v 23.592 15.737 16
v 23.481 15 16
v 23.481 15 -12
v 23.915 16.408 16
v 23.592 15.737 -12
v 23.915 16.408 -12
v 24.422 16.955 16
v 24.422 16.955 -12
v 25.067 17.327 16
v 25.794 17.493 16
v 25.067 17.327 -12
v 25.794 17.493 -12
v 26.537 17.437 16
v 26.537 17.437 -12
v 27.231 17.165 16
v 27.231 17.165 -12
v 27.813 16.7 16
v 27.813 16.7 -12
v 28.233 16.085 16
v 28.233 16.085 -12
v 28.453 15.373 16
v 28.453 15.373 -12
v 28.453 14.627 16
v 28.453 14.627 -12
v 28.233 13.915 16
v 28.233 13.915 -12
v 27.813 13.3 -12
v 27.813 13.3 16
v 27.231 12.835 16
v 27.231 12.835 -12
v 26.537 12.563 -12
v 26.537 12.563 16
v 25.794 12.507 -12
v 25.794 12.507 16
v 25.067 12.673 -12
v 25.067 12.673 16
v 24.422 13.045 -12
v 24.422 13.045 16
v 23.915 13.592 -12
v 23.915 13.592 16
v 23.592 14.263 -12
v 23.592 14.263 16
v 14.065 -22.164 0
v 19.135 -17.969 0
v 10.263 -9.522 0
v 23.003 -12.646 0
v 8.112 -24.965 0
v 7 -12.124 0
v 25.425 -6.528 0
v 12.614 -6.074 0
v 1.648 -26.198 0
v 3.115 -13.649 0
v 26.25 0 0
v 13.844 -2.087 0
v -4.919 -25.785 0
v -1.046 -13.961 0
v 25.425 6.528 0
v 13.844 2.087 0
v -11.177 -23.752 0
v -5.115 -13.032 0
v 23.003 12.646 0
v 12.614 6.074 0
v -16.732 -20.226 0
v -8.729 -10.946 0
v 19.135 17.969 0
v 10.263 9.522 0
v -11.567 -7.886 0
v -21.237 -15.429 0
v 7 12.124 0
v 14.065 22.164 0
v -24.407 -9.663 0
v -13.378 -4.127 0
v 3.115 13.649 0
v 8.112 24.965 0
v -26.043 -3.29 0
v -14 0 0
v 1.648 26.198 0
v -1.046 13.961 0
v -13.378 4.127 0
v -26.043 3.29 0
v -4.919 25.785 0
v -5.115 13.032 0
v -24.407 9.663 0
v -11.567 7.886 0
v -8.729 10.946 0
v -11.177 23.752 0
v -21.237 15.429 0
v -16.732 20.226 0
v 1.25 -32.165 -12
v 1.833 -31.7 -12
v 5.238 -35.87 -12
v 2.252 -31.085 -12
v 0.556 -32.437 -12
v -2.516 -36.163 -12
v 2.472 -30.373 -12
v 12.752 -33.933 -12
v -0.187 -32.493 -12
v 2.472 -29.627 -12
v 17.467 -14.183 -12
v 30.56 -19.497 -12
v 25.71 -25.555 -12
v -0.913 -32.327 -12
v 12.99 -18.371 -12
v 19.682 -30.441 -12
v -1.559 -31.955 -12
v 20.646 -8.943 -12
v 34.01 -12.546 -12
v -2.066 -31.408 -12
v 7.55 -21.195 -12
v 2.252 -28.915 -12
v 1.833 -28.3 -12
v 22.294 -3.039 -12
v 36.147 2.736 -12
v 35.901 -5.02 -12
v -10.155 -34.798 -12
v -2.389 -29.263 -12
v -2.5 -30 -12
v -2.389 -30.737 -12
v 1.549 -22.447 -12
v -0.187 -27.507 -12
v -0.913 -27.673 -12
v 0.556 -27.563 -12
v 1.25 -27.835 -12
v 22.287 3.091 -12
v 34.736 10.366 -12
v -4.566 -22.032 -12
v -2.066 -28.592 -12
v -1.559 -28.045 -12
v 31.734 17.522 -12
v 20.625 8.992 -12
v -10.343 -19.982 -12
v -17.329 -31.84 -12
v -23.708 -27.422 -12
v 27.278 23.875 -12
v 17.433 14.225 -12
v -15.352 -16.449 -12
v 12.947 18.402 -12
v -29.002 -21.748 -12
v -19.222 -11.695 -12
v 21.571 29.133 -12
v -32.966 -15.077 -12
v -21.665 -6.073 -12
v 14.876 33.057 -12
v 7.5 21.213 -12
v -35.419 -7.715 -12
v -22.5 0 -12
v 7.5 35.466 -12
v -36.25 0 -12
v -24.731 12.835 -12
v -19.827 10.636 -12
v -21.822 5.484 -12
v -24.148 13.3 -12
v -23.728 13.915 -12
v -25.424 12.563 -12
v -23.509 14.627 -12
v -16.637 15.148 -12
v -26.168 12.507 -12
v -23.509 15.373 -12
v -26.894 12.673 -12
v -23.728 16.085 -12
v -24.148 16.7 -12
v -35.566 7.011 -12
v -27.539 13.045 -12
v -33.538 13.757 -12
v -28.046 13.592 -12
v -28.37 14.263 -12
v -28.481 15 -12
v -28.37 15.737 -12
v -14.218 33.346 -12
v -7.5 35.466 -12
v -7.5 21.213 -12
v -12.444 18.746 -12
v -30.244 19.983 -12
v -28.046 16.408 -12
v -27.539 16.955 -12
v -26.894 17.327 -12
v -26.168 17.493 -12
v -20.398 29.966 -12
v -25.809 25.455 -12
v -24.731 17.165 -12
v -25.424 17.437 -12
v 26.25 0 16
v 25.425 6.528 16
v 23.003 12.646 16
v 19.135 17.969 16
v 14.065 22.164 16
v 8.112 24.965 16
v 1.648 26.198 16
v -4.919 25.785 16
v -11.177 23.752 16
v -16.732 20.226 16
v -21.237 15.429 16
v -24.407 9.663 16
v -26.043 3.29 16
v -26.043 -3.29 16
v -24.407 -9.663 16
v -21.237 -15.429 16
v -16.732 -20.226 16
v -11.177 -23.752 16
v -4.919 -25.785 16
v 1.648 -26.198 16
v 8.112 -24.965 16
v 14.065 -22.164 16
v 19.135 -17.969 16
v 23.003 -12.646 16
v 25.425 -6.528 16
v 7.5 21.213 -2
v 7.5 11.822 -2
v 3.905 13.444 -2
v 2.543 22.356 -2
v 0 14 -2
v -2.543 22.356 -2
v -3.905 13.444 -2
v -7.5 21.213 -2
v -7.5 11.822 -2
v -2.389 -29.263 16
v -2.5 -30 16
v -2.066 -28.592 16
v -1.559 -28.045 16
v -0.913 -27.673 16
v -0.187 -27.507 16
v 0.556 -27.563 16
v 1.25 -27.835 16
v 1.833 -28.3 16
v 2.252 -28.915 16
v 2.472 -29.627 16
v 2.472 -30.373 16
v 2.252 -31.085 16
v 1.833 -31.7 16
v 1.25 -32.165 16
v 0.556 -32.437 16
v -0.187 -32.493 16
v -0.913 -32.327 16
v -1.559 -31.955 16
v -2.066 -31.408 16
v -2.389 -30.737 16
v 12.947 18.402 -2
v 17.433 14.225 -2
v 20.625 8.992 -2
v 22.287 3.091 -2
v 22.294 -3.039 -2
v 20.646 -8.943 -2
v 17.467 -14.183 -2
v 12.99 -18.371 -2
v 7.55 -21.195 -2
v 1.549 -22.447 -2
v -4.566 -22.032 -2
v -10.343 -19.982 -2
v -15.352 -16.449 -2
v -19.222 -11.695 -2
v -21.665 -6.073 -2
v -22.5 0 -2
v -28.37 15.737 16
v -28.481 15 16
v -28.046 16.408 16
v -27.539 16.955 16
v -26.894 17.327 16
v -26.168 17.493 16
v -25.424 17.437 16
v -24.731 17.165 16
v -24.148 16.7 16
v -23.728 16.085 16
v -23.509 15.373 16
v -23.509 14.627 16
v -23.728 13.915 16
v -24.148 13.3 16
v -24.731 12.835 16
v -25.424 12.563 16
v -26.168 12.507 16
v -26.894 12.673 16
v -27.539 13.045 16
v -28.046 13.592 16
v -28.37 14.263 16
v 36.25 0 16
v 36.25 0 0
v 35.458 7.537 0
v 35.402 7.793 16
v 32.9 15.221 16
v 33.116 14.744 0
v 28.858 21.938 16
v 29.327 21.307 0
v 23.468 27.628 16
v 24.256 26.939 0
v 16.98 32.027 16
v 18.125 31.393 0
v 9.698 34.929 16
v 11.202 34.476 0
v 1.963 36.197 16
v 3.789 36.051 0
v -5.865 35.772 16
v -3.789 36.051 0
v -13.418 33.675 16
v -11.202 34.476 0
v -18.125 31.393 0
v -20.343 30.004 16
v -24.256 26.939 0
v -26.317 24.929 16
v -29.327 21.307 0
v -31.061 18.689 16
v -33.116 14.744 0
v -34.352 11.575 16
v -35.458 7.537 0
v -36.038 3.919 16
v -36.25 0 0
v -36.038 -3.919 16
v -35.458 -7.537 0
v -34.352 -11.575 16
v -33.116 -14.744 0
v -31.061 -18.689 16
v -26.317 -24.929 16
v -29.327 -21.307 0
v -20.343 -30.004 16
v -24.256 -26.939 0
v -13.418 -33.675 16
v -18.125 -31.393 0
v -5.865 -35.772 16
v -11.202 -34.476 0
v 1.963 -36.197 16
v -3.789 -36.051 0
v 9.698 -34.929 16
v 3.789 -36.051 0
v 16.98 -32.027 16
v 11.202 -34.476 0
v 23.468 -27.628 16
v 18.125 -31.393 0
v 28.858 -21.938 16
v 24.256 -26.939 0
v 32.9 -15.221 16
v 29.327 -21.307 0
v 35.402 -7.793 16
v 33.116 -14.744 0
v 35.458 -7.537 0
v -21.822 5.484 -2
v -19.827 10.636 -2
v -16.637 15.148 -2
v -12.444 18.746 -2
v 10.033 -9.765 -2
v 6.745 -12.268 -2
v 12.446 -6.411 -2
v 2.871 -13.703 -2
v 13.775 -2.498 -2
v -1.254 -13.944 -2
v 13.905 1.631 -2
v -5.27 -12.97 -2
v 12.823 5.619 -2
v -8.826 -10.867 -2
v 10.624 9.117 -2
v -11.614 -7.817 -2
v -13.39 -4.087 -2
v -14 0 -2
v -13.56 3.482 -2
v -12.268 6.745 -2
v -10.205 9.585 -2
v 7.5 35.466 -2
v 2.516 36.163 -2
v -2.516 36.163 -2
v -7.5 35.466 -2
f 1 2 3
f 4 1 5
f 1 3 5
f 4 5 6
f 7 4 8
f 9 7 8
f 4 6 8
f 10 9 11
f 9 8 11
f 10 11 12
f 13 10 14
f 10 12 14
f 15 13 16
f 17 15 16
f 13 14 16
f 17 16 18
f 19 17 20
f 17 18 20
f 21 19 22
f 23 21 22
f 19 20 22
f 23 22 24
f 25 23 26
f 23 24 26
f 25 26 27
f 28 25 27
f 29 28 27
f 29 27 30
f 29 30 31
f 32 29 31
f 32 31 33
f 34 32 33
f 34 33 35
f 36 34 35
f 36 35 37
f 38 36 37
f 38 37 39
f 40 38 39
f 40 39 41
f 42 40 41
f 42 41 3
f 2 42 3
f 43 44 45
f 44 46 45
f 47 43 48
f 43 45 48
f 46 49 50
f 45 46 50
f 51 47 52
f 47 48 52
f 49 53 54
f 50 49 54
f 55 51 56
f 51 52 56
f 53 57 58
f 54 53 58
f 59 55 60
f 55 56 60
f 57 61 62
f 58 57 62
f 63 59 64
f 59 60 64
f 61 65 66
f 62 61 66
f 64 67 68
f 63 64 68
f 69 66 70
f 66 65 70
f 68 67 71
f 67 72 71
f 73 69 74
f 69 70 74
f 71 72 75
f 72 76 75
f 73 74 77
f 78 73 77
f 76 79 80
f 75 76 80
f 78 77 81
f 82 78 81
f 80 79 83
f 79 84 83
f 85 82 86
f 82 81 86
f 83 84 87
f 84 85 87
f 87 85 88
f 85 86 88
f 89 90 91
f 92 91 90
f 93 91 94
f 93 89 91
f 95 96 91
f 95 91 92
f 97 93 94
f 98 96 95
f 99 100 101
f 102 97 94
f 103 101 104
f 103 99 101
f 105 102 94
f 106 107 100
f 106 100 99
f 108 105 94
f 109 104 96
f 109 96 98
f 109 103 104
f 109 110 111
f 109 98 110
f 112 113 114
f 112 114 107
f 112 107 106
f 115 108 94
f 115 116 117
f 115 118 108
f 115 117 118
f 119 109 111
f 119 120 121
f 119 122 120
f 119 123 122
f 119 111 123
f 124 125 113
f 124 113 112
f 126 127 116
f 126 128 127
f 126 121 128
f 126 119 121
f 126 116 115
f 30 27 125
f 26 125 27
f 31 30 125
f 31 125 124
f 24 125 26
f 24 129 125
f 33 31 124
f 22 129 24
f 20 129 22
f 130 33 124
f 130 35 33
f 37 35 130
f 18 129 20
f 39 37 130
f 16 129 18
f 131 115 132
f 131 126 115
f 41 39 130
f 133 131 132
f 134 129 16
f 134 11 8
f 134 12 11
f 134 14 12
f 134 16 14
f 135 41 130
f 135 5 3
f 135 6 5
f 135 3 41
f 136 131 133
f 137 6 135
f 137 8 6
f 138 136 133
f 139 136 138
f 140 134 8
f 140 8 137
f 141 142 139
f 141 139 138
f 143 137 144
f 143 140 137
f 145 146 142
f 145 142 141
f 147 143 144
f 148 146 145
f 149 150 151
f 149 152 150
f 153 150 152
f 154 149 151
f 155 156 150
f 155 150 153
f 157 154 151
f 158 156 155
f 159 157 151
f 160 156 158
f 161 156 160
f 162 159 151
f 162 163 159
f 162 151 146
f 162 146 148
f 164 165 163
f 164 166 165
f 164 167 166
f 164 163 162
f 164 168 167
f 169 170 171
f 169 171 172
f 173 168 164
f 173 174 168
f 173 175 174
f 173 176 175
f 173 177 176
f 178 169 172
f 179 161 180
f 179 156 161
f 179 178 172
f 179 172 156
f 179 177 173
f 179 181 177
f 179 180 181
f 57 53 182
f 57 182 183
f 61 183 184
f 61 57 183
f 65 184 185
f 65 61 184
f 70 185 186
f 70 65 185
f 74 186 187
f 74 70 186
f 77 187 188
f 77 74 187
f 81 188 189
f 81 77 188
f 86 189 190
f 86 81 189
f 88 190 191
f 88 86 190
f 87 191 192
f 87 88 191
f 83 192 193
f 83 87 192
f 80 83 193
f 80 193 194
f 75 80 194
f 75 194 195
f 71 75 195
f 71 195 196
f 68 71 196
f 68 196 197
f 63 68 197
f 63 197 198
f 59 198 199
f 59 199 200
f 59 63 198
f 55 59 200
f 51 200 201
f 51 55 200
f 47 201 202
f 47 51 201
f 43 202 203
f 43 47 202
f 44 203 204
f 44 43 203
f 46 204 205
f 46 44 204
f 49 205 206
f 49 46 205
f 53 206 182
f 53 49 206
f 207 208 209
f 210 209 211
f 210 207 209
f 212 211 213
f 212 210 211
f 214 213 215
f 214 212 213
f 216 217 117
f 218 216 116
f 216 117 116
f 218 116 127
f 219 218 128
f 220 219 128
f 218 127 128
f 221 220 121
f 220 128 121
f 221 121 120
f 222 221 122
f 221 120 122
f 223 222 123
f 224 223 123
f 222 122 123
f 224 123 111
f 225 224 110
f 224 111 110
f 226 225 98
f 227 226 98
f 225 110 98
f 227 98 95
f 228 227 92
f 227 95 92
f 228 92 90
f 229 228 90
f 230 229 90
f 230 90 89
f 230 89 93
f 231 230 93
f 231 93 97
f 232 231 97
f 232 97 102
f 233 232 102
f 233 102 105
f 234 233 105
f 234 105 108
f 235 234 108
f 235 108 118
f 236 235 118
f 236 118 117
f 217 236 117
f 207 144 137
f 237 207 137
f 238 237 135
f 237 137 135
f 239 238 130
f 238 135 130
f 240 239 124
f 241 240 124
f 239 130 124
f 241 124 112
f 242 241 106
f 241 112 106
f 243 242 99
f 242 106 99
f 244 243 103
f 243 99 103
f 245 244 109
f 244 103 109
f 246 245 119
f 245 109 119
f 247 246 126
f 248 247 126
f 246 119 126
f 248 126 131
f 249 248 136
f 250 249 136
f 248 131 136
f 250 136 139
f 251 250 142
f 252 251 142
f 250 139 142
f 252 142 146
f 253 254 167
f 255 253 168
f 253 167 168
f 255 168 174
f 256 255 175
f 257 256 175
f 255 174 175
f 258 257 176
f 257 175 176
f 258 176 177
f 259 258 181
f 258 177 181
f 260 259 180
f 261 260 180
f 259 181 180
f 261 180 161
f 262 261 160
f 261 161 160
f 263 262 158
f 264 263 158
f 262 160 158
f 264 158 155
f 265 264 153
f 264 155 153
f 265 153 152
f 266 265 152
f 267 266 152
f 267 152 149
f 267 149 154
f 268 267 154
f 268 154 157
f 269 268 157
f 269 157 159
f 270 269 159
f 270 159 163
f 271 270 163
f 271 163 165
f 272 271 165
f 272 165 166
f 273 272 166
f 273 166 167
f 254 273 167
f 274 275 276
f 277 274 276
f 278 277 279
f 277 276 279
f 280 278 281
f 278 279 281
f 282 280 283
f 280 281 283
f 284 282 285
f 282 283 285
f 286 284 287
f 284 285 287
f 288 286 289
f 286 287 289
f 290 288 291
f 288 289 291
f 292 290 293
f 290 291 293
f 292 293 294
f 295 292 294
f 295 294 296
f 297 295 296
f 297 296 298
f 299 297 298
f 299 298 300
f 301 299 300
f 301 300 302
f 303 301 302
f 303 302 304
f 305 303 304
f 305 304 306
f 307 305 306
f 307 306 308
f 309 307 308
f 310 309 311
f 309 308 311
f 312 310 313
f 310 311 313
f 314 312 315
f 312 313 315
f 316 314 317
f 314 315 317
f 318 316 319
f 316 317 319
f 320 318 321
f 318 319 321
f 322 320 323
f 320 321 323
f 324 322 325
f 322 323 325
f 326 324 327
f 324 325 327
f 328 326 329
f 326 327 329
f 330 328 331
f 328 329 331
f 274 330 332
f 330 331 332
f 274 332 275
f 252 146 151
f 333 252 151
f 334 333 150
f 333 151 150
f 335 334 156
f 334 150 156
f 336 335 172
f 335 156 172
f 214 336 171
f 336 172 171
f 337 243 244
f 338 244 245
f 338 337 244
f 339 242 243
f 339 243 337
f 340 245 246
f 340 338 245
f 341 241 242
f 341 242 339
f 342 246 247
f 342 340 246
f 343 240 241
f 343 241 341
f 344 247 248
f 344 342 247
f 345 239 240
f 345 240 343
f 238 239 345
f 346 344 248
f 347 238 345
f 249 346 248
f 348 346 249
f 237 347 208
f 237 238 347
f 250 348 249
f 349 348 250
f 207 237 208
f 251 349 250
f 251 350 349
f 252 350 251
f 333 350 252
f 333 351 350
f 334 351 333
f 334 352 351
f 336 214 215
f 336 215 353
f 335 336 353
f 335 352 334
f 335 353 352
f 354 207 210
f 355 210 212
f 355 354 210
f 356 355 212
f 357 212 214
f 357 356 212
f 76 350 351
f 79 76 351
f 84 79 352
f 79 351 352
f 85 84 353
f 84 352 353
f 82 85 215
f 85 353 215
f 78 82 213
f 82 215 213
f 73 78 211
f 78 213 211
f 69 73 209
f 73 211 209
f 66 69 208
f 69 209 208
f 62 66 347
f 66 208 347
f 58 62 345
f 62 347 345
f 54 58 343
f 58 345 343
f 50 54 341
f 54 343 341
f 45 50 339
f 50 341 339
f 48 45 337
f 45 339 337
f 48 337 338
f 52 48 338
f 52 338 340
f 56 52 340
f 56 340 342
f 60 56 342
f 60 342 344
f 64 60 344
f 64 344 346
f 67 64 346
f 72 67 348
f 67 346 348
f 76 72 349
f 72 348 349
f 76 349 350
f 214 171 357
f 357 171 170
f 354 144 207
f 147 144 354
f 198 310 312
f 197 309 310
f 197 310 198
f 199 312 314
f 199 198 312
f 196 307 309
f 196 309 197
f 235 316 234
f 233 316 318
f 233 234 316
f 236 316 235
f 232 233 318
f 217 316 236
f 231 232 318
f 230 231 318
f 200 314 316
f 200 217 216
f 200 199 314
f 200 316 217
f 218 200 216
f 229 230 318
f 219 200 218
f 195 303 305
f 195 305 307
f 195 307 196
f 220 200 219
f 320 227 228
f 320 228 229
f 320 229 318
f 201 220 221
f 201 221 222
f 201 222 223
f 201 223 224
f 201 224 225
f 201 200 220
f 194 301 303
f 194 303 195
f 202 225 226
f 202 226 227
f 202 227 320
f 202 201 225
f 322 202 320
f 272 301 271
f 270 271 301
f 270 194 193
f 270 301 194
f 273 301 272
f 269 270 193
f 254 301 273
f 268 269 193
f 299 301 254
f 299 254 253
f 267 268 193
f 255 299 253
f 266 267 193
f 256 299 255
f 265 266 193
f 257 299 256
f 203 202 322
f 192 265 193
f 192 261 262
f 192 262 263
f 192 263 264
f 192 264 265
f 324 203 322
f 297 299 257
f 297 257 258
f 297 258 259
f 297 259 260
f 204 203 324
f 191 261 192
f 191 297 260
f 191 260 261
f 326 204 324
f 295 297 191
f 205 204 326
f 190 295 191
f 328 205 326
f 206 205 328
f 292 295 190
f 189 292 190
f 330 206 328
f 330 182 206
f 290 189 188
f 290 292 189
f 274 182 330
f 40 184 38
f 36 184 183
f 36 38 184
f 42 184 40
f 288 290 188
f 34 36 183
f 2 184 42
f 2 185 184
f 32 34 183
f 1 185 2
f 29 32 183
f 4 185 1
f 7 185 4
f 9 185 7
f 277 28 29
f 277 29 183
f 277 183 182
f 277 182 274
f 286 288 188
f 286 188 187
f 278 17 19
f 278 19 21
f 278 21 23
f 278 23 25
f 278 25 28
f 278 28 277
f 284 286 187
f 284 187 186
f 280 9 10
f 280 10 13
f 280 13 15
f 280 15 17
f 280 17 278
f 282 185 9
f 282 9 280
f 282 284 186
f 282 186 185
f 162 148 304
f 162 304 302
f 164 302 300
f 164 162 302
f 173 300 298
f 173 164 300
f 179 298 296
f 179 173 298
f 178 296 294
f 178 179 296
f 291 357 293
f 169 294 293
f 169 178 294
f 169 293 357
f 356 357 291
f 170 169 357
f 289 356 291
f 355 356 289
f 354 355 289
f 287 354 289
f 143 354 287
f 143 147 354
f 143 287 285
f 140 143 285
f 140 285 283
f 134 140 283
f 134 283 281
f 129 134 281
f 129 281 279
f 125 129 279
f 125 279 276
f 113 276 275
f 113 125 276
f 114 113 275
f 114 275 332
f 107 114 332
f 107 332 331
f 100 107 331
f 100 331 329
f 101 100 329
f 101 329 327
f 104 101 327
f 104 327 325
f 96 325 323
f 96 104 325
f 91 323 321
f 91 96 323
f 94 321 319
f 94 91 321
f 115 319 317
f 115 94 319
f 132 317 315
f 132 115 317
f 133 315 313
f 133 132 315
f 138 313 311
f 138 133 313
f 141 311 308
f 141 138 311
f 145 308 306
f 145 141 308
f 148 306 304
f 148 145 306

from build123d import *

# Parameters (mm, degrees)
SKETCH1_R           = 36.25
SKETCH1_R_2         = 26.25
BOSS_EXTRUDE1_DEPTH = 16
BOSS_EXTRUDE2_START = 12
SKETCH2_R           = 36.25
SKETCH2_R_2         = 14
BOSS_EXTRUDE2_DEPTH = 12
SKETCH4_W           = 15
SKETCH4_H           = 30
CUT_EXTRUDE1_DEPTH  = 10
SKETCH5_R           = 22.5
CUT_EXTRUDE2_DEPTH  = 10
SKETCH7_R           = 2.5
CUT_EXTRUDE3_DEPTH  = 59.413397436


with BuildPart() as part:
    # Sketch1 → Boss-Extrude1 (new body)
    with BuildSketch(Plane.XY):
        Circle(SKETCH1_R)
        Circle(SKETCH1_R_2, mode=Mode.SUBTRACT)
    extrude(amount=BOSS_EXTRUDE1_DEPTH)

    # Sketch2 → Boss-Extrude2 (add)
    with BuildSketch(Plane(origin=(0, 0, 0), x_dir=(-1, 0, 0), z_dir=(0, 0, -1)).offset(BOSS_EXTRUDE2_START)):
        Circle(SKETCH2_R)
        Circle(SKETCH2_R_2, mode=Mode.SUBTRACT)
    extrude(amount=-BOSS_EXTRUDE2_DEPTH)

    # Sketch4 → Cut-Extrude1 (cut)
    with BuildSketch(Plane(origin=(0, 0, -12), x_dir=(-1, 0, 0), z_dir=(0, 0, -1))):
        with Locations((0, 23)):
            Rectangle(SKETCH4_W, SKETCH4_H)
    extrude(amount=-CUT_EXTRUDE1_DEPTH, mode=Mode.SUBTRACT)

    # Sketch5 → Cut-Extrude2 (cut)
    with BuildSketch(Plane(origin=(0, 0, -12), x_dir=(-1, 0, 0), z_dir=(0, 0, -1))):
        Circle(SKETCH5_R)
    extrude(amount=-CUT_EXTRUDE2_DEPTH, mode=Mode.SUBTRACT)

    # Sketch7 → Cut-Extrude3 (cut, through all)
    with BuildSketch(Plane(origin=(0, 0, -12), x_dir=(-1, 0, 0), z_dir=(0, 0, -1))):
        with Locations((-25.980762114, 15)):
            Circle(SKETCH7_R)
        with Locations((25.980762114, 15)):
            Circle(SKETCH7_R)
        with Locations((0, -30)):
            Circle(SKETCH7_R)
    extrude(amount=-CUT_EXTRUDE3_DEPTH, mode=Mode.SUBTRACT)


solid = part.part
